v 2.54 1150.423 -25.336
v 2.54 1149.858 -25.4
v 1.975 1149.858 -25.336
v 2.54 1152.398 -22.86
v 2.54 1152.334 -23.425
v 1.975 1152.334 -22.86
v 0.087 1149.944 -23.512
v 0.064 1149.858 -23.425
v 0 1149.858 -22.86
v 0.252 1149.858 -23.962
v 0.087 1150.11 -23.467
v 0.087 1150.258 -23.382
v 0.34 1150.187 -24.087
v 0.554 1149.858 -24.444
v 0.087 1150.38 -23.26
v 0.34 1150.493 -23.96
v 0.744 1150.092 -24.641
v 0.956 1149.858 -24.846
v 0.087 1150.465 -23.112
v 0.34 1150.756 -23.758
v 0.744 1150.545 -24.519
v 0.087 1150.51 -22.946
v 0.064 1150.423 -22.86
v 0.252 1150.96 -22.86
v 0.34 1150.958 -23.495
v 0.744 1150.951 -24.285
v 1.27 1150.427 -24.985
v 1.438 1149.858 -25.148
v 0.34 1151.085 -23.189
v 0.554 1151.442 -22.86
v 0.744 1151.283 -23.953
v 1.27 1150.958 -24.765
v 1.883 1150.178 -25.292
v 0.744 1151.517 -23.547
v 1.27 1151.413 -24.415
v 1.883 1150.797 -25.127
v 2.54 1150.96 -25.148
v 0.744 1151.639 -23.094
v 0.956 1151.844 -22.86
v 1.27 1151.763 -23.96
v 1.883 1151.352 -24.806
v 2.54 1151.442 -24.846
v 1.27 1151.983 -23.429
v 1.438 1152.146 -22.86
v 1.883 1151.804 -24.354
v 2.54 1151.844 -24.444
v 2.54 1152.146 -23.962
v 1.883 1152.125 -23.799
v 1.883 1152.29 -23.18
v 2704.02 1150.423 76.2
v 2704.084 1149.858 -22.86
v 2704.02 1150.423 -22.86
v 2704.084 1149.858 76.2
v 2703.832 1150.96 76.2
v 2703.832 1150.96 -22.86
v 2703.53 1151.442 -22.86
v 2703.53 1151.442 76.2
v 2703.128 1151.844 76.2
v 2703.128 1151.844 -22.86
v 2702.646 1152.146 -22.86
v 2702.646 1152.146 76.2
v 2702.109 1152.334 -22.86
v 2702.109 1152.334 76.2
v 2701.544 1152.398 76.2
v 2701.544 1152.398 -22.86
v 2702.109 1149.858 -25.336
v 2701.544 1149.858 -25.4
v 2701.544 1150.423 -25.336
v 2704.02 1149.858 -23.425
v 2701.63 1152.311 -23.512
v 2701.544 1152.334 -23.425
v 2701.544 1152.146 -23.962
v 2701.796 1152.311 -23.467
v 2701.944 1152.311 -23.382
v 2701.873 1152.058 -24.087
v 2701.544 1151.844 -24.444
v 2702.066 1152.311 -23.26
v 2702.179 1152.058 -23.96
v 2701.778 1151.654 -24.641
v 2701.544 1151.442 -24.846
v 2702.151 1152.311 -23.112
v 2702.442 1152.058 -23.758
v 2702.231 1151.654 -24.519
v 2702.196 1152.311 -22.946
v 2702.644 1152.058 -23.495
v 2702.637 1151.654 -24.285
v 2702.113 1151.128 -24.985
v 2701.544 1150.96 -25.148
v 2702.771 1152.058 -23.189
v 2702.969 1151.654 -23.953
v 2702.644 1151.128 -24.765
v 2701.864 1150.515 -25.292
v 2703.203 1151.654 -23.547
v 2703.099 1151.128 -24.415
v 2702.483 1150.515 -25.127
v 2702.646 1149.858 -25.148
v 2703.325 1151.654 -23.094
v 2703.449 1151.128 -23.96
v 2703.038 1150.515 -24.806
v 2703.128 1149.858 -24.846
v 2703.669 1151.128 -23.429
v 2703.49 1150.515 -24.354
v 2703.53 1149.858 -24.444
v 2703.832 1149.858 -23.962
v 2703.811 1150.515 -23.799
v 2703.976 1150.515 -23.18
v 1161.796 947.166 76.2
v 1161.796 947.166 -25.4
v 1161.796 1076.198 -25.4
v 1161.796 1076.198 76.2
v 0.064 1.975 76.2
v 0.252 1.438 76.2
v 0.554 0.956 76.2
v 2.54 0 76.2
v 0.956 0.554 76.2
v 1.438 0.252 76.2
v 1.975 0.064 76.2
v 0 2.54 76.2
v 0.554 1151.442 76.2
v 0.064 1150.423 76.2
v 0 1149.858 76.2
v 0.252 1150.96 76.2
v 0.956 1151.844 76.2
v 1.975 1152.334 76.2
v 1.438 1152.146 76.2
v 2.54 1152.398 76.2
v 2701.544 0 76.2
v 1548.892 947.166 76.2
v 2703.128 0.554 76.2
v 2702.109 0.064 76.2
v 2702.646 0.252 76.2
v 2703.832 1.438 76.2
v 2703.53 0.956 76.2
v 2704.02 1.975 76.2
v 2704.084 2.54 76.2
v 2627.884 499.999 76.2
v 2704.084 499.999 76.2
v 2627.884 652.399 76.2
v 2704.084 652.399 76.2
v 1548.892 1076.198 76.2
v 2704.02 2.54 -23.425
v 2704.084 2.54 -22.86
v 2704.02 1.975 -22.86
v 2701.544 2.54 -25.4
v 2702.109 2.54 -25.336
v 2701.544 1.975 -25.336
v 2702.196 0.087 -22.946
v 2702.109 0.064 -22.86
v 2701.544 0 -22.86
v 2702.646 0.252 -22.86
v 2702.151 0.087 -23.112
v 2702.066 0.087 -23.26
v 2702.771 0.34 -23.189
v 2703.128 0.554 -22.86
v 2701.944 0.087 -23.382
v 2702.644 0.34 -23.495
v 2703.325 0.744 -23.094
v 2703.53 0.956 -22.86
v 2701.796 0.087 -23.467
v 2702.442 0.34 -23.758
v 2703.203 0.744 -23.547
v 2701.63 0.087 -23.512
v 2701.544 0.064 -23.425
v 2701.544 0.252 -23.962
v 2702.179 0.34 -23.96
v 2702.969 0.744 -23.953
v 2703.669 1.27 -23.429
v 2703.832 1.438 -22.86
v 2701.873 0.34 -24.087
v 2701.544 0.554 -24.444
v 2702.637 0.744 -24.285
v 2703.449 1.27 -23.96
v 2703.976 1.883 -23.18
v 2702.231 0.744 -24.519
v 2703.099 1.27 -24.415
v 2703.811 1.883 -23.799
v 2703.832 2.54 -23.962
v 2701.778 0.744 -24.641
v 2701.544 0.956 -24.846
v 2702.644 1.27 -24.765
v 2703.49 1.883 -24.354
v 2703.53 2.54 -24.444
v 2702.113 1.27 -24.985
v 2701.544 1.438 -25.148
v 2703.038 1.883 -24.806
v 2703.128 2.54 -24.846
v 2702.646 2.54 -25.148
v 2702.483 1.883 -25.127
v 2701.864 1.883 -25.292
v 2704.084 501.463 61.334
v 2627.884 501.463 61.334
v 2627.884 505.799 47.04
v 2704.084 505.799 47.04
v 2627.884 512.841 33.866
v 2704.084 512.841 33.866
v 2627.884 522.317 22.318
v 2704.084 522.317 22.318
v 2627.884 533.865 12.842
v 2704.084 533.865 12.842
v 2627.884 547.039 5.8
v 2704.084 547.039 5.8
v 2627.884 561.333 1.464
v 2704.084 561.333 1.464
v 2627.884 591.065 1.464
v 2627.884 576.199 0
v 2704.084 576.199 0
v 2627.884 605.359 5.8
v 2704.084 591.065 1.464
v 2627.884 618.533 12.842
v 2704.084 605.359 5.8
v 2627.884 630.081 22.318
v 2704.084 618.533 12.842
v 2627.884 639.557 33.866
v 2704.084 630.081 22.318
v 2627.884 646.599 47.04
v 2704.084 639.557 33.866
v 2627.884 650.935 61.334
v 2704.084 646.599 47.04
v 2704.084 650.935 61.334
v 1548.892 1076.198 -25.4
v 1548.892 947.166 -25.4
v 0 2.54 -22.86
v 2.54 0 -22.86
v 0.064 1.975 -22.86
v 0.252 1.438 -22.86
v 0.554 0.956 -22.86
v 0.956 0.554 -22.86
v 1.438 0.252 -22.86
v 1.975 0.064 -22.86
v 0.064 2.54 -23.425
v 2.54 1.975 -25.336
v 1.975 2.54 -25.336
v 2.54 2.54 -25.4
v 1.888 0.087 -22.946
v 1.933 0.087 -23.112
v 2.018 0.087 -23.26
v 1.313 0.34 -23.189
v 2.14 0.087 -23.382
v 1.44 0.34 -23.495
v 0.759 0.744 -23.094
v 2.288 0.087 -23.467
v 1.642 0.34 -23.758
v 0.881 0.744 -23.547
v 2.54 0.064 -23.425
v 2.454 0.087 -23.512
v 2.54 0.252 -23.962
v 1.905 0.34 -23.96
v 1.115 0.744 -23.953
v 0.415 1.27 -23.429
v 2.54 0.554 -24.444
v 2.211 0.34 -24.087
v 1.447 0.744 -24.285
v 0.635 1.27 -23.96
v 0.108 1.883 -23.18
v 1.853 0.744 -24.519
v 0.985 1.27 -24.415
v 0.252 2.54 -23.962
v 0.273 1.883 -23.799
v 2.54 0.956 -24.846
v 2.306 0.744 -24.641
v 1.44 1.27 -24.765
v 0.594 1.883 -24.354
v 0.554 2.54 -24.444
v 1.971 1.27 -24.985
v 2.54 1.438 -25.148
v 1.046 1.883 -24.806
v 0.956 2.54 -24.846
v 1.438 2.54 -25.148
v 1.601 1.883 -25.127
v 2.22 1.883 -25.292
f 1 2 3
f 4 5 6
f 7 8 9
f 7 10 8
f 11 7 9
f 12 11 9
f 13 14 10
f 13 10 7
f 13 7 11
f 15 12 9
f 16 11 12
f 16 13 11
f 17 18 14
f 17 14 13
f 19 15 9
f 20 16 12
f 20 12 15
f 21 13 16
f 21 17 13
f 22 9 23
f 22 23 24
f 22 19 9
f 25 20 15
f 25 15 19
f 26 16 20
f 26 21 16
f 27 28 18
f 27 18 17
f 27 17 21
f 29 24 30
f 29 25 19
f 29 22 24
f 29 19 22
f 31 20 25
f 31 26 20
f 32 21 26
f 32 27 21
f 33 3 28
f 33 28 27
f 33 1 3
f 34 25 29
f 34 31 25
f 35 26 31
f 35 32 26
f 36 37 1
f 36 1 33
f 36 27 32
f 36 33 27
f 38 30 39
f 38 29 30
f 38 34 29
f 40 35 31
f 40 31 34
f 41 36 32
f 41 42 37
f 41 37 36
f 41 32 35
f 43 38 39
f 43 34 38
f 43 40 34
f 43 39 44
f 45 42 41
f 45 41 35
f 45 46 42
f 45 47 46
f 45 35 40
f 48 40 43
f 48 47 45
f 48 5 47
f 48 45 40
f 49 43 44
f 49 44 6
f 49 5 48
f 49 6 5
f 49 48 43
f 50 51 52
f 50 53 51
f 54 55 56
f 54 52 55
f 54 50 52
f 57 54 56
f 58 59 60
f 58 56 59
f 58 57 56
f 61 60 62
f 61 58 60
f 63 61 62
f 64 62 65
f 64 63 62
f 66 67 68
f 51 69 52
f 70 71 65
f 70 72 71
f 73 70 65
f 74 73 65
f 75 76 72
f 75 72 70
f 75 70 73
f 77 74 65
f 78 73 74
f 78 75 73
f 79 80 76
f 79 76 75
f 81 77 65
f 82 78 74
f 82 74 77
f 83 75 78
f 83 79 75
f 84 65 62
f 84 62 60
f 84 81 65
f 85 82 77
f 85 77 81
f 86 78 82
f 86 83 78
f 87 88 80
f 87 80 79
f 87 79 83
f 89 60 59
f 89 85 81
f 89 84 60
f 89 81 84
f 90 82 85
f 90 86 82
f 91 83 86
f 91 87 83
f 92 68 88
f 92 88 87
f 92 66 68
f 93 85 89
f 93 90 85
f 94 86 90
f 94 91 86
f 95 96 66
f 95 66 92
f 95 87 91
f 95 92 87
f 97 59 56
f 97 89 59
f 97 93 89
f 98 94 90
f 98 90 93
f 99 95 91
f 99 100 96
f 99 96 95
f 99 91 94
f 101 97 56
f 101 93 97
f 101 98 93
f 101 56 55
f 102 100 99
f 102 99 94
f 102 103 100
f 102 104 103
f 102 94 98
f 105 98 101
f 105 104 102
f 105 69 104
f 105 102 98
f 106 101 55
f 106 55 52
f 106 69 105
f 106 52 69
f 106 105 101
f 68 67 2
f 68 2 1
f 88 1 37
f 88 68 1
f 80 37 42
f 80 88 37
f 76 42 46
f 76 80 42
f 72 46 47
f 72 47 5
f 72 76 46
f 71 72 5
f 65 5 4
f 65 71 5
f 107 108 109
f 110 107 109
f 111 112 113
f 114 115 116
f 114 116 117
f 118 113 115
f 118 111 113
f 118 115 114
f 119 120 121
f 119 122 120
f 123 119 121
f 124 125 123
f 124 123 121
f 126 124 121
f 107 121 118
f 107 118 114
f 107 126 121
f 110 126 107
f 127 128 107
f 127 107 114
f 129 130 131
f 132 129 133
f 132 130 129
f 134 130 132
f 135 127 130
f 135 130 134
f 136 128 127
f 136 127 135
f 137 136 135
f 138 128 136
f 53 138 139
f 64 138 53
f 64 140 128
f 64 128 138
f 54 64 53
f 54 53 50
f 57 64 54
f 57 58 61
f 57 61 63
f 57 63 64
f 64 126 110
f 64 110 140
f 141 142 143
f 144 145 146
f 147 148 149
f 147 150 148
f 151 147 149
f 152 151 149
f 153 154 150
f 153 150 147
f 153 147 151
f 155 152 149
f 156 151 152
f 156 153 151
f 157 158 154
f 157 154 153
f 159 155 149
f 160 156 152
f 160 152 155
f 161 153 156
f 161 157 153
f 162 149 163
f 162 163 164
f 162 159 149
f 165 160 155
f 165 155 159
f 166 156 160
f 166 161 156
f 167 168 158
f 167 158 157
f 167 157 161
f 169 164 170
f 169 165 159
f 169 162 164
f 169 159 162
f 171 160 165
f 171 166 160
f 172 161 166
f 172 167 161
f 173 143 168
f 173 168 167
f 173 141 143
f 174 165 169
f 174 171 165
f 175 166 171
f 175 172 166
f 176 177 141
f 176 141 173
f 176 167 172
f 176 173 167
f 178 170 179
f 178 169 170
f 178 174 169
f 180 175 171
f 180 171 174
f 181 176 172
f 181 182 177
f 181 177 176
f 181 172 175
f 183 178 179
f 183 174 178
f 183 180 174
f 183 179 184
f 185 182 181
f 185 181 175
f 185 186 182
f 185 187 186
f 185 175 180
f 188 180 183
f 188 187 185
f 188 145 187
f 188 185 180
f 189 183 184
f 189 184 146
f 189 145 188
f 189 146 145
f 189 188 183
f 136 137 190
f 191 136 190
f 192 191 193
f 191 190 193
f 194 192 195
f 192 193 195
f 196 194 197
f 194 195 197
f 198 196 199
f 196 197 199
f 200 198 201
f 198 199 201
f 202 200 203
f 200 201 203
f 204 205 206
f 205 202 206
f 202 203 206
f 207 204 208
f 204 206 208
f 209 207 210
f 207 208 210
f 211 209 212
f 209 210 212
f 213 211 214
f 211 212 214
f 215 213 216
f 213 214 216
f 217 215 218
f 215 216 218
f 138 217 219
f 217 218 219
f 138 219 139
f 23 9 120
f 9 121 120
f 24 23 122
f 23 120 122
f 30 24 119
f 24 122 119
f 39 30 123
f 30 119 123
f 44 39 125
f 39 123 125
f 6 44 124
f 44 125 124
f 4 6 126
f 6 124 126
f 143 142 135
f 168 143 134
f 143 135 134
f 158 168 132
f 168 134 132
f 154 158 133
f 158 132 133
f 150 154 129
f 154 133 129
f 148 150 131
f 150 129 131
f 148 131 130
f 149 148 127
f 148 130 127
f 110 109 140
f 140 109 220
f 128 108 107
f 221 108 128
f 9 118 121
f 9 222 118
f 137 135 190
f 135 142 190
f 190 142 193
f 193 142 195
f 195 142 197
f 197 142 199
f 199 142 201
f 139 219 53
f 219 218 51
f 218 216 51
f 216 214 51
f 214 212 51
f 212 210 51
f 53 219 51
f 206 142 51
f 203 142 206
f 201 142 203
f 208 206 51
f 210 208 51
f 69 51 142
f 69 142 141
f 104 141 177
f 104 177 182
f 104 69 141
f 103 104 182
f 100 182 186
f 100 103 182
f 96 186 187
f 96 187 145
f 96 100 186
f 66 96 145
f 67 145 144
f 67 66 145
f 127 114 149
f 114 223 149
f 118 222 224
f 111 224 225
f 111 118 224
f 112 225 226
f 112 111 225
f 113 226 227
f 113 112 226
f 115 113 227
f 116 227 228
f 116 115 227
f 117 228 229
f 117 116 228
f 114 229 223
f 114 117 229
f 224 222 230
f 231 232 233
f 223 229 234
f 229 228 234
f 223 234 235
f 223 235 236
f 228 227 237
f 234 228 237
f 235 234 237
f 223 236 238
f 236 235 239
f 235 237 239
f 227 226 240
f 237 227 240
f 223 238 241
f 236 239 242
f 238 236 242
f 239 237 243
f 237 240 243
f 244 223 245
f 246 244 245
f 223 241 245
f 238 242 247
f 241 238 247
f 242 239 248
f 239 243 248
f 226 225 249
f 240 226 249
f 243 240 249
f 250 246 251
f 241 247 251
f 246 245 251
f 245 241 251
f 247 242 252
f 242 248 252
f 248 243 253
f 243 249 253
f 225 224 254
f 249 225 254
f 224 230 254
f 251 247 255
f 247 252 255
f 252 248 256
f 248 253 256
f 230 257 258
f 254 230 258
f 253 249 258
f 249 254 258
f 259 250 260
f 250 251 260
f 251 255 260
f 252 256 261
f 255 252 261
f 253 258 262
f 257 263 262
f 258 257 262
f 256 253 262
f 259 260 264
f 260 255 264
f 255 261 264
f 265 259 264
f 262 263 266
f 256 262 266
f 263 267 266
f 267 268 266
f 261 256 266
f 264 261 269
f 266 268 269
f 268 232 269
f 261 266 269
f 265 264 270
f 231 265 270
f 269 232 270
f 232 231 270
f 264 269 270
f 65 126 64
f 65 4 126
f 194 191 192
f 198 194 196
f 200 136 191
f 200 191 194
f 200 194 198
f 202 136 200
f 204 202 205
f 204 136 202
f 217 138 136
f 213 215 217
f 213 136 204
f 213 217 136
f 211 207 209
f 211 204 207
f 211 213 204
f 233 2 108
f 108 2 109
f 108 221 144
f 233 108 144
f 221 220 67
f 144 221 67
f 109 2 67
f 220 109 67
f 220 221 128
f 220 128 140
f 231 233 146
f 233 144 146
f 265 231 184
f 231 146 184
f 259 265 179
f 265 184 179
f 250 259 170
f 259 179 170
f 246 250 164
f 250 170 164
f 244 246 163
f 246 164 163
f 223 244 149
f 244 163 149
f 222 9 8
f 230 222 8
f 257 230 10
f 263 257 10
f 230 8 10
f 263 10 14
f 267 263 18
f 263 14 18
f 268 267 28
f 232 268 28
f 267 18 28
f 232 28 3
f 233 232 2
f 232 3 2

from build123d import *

# Parameters (mm, degrees)
BOSS_EXTRUDE1_DEPTH      = 76.2
BOSS_EXTRUDE1_DEPTH_BACK = 25.4
SKETCH1_W                = 2704.084
SKETCH1_H                = 1152.398
SKETCH1_W_2              = 387.096
SKETCH1_H_2              = 129.032
SKETCH2_R                = 76.2
CUT_EXTRUDE1_DEPTH       = 76.2
FILLET1_R                = 2.54


with BuildPart() as part:
    # Sketch1 → Boss-Extrude1 (new, two sides: drawn at the far end of the back side and taken through both)
    with BuildSketch(Plane.XY.offset(-BOSS_EXTRUDE1_DEPTH_BACK)):
        with Locations((1352.042, 576.199)):
            Rectangle(SKETCH1_W, SKETCH1_H)
        with Locations((1355.344, 1011.682)):
            Rectangle(SKETCH1_W_2, SKETCH1_H_2, mode=Mode.SUBTRACT)
    extrude(amount=BOSS_EXTRUDE1_DEPTH + BOSS_EXTRUDE1_DEPTH_BACK)

    # Sketch2 → Cut-Extrude1 (cut)
    with BuildSketch(Plane(origin=(2704.084, 0, 0), x_dir=(0, 0, -1), z_dir=(1, 0, 0))):
        with Locations((-76.2, 576.199)):
            Circle(SKETCH2_R)
    extrude(amount=-CUT_EXTRUDE1_DEPTH, mode=Mode.SUBTRACT)

    # Fillet1
    fillet1_edges = [part.edges().sort_by_distance(p)[0] for p in [
        (2704.084, 576.199, -25.4),
        (1352.042, 1152.398, -25.4),
        (0, 576.199, -25.4),
        (0, 1152.398, 25.4),
        (2704.084, 1152.398, 25.4),
        (2704.084, 0, 25.4),
        (0, 0, 25.4),
        (1352.042, 0, -25.4),
    ]]
    fillet(fillet1_edges, radius=FILLET1_R)


solid = part.part
